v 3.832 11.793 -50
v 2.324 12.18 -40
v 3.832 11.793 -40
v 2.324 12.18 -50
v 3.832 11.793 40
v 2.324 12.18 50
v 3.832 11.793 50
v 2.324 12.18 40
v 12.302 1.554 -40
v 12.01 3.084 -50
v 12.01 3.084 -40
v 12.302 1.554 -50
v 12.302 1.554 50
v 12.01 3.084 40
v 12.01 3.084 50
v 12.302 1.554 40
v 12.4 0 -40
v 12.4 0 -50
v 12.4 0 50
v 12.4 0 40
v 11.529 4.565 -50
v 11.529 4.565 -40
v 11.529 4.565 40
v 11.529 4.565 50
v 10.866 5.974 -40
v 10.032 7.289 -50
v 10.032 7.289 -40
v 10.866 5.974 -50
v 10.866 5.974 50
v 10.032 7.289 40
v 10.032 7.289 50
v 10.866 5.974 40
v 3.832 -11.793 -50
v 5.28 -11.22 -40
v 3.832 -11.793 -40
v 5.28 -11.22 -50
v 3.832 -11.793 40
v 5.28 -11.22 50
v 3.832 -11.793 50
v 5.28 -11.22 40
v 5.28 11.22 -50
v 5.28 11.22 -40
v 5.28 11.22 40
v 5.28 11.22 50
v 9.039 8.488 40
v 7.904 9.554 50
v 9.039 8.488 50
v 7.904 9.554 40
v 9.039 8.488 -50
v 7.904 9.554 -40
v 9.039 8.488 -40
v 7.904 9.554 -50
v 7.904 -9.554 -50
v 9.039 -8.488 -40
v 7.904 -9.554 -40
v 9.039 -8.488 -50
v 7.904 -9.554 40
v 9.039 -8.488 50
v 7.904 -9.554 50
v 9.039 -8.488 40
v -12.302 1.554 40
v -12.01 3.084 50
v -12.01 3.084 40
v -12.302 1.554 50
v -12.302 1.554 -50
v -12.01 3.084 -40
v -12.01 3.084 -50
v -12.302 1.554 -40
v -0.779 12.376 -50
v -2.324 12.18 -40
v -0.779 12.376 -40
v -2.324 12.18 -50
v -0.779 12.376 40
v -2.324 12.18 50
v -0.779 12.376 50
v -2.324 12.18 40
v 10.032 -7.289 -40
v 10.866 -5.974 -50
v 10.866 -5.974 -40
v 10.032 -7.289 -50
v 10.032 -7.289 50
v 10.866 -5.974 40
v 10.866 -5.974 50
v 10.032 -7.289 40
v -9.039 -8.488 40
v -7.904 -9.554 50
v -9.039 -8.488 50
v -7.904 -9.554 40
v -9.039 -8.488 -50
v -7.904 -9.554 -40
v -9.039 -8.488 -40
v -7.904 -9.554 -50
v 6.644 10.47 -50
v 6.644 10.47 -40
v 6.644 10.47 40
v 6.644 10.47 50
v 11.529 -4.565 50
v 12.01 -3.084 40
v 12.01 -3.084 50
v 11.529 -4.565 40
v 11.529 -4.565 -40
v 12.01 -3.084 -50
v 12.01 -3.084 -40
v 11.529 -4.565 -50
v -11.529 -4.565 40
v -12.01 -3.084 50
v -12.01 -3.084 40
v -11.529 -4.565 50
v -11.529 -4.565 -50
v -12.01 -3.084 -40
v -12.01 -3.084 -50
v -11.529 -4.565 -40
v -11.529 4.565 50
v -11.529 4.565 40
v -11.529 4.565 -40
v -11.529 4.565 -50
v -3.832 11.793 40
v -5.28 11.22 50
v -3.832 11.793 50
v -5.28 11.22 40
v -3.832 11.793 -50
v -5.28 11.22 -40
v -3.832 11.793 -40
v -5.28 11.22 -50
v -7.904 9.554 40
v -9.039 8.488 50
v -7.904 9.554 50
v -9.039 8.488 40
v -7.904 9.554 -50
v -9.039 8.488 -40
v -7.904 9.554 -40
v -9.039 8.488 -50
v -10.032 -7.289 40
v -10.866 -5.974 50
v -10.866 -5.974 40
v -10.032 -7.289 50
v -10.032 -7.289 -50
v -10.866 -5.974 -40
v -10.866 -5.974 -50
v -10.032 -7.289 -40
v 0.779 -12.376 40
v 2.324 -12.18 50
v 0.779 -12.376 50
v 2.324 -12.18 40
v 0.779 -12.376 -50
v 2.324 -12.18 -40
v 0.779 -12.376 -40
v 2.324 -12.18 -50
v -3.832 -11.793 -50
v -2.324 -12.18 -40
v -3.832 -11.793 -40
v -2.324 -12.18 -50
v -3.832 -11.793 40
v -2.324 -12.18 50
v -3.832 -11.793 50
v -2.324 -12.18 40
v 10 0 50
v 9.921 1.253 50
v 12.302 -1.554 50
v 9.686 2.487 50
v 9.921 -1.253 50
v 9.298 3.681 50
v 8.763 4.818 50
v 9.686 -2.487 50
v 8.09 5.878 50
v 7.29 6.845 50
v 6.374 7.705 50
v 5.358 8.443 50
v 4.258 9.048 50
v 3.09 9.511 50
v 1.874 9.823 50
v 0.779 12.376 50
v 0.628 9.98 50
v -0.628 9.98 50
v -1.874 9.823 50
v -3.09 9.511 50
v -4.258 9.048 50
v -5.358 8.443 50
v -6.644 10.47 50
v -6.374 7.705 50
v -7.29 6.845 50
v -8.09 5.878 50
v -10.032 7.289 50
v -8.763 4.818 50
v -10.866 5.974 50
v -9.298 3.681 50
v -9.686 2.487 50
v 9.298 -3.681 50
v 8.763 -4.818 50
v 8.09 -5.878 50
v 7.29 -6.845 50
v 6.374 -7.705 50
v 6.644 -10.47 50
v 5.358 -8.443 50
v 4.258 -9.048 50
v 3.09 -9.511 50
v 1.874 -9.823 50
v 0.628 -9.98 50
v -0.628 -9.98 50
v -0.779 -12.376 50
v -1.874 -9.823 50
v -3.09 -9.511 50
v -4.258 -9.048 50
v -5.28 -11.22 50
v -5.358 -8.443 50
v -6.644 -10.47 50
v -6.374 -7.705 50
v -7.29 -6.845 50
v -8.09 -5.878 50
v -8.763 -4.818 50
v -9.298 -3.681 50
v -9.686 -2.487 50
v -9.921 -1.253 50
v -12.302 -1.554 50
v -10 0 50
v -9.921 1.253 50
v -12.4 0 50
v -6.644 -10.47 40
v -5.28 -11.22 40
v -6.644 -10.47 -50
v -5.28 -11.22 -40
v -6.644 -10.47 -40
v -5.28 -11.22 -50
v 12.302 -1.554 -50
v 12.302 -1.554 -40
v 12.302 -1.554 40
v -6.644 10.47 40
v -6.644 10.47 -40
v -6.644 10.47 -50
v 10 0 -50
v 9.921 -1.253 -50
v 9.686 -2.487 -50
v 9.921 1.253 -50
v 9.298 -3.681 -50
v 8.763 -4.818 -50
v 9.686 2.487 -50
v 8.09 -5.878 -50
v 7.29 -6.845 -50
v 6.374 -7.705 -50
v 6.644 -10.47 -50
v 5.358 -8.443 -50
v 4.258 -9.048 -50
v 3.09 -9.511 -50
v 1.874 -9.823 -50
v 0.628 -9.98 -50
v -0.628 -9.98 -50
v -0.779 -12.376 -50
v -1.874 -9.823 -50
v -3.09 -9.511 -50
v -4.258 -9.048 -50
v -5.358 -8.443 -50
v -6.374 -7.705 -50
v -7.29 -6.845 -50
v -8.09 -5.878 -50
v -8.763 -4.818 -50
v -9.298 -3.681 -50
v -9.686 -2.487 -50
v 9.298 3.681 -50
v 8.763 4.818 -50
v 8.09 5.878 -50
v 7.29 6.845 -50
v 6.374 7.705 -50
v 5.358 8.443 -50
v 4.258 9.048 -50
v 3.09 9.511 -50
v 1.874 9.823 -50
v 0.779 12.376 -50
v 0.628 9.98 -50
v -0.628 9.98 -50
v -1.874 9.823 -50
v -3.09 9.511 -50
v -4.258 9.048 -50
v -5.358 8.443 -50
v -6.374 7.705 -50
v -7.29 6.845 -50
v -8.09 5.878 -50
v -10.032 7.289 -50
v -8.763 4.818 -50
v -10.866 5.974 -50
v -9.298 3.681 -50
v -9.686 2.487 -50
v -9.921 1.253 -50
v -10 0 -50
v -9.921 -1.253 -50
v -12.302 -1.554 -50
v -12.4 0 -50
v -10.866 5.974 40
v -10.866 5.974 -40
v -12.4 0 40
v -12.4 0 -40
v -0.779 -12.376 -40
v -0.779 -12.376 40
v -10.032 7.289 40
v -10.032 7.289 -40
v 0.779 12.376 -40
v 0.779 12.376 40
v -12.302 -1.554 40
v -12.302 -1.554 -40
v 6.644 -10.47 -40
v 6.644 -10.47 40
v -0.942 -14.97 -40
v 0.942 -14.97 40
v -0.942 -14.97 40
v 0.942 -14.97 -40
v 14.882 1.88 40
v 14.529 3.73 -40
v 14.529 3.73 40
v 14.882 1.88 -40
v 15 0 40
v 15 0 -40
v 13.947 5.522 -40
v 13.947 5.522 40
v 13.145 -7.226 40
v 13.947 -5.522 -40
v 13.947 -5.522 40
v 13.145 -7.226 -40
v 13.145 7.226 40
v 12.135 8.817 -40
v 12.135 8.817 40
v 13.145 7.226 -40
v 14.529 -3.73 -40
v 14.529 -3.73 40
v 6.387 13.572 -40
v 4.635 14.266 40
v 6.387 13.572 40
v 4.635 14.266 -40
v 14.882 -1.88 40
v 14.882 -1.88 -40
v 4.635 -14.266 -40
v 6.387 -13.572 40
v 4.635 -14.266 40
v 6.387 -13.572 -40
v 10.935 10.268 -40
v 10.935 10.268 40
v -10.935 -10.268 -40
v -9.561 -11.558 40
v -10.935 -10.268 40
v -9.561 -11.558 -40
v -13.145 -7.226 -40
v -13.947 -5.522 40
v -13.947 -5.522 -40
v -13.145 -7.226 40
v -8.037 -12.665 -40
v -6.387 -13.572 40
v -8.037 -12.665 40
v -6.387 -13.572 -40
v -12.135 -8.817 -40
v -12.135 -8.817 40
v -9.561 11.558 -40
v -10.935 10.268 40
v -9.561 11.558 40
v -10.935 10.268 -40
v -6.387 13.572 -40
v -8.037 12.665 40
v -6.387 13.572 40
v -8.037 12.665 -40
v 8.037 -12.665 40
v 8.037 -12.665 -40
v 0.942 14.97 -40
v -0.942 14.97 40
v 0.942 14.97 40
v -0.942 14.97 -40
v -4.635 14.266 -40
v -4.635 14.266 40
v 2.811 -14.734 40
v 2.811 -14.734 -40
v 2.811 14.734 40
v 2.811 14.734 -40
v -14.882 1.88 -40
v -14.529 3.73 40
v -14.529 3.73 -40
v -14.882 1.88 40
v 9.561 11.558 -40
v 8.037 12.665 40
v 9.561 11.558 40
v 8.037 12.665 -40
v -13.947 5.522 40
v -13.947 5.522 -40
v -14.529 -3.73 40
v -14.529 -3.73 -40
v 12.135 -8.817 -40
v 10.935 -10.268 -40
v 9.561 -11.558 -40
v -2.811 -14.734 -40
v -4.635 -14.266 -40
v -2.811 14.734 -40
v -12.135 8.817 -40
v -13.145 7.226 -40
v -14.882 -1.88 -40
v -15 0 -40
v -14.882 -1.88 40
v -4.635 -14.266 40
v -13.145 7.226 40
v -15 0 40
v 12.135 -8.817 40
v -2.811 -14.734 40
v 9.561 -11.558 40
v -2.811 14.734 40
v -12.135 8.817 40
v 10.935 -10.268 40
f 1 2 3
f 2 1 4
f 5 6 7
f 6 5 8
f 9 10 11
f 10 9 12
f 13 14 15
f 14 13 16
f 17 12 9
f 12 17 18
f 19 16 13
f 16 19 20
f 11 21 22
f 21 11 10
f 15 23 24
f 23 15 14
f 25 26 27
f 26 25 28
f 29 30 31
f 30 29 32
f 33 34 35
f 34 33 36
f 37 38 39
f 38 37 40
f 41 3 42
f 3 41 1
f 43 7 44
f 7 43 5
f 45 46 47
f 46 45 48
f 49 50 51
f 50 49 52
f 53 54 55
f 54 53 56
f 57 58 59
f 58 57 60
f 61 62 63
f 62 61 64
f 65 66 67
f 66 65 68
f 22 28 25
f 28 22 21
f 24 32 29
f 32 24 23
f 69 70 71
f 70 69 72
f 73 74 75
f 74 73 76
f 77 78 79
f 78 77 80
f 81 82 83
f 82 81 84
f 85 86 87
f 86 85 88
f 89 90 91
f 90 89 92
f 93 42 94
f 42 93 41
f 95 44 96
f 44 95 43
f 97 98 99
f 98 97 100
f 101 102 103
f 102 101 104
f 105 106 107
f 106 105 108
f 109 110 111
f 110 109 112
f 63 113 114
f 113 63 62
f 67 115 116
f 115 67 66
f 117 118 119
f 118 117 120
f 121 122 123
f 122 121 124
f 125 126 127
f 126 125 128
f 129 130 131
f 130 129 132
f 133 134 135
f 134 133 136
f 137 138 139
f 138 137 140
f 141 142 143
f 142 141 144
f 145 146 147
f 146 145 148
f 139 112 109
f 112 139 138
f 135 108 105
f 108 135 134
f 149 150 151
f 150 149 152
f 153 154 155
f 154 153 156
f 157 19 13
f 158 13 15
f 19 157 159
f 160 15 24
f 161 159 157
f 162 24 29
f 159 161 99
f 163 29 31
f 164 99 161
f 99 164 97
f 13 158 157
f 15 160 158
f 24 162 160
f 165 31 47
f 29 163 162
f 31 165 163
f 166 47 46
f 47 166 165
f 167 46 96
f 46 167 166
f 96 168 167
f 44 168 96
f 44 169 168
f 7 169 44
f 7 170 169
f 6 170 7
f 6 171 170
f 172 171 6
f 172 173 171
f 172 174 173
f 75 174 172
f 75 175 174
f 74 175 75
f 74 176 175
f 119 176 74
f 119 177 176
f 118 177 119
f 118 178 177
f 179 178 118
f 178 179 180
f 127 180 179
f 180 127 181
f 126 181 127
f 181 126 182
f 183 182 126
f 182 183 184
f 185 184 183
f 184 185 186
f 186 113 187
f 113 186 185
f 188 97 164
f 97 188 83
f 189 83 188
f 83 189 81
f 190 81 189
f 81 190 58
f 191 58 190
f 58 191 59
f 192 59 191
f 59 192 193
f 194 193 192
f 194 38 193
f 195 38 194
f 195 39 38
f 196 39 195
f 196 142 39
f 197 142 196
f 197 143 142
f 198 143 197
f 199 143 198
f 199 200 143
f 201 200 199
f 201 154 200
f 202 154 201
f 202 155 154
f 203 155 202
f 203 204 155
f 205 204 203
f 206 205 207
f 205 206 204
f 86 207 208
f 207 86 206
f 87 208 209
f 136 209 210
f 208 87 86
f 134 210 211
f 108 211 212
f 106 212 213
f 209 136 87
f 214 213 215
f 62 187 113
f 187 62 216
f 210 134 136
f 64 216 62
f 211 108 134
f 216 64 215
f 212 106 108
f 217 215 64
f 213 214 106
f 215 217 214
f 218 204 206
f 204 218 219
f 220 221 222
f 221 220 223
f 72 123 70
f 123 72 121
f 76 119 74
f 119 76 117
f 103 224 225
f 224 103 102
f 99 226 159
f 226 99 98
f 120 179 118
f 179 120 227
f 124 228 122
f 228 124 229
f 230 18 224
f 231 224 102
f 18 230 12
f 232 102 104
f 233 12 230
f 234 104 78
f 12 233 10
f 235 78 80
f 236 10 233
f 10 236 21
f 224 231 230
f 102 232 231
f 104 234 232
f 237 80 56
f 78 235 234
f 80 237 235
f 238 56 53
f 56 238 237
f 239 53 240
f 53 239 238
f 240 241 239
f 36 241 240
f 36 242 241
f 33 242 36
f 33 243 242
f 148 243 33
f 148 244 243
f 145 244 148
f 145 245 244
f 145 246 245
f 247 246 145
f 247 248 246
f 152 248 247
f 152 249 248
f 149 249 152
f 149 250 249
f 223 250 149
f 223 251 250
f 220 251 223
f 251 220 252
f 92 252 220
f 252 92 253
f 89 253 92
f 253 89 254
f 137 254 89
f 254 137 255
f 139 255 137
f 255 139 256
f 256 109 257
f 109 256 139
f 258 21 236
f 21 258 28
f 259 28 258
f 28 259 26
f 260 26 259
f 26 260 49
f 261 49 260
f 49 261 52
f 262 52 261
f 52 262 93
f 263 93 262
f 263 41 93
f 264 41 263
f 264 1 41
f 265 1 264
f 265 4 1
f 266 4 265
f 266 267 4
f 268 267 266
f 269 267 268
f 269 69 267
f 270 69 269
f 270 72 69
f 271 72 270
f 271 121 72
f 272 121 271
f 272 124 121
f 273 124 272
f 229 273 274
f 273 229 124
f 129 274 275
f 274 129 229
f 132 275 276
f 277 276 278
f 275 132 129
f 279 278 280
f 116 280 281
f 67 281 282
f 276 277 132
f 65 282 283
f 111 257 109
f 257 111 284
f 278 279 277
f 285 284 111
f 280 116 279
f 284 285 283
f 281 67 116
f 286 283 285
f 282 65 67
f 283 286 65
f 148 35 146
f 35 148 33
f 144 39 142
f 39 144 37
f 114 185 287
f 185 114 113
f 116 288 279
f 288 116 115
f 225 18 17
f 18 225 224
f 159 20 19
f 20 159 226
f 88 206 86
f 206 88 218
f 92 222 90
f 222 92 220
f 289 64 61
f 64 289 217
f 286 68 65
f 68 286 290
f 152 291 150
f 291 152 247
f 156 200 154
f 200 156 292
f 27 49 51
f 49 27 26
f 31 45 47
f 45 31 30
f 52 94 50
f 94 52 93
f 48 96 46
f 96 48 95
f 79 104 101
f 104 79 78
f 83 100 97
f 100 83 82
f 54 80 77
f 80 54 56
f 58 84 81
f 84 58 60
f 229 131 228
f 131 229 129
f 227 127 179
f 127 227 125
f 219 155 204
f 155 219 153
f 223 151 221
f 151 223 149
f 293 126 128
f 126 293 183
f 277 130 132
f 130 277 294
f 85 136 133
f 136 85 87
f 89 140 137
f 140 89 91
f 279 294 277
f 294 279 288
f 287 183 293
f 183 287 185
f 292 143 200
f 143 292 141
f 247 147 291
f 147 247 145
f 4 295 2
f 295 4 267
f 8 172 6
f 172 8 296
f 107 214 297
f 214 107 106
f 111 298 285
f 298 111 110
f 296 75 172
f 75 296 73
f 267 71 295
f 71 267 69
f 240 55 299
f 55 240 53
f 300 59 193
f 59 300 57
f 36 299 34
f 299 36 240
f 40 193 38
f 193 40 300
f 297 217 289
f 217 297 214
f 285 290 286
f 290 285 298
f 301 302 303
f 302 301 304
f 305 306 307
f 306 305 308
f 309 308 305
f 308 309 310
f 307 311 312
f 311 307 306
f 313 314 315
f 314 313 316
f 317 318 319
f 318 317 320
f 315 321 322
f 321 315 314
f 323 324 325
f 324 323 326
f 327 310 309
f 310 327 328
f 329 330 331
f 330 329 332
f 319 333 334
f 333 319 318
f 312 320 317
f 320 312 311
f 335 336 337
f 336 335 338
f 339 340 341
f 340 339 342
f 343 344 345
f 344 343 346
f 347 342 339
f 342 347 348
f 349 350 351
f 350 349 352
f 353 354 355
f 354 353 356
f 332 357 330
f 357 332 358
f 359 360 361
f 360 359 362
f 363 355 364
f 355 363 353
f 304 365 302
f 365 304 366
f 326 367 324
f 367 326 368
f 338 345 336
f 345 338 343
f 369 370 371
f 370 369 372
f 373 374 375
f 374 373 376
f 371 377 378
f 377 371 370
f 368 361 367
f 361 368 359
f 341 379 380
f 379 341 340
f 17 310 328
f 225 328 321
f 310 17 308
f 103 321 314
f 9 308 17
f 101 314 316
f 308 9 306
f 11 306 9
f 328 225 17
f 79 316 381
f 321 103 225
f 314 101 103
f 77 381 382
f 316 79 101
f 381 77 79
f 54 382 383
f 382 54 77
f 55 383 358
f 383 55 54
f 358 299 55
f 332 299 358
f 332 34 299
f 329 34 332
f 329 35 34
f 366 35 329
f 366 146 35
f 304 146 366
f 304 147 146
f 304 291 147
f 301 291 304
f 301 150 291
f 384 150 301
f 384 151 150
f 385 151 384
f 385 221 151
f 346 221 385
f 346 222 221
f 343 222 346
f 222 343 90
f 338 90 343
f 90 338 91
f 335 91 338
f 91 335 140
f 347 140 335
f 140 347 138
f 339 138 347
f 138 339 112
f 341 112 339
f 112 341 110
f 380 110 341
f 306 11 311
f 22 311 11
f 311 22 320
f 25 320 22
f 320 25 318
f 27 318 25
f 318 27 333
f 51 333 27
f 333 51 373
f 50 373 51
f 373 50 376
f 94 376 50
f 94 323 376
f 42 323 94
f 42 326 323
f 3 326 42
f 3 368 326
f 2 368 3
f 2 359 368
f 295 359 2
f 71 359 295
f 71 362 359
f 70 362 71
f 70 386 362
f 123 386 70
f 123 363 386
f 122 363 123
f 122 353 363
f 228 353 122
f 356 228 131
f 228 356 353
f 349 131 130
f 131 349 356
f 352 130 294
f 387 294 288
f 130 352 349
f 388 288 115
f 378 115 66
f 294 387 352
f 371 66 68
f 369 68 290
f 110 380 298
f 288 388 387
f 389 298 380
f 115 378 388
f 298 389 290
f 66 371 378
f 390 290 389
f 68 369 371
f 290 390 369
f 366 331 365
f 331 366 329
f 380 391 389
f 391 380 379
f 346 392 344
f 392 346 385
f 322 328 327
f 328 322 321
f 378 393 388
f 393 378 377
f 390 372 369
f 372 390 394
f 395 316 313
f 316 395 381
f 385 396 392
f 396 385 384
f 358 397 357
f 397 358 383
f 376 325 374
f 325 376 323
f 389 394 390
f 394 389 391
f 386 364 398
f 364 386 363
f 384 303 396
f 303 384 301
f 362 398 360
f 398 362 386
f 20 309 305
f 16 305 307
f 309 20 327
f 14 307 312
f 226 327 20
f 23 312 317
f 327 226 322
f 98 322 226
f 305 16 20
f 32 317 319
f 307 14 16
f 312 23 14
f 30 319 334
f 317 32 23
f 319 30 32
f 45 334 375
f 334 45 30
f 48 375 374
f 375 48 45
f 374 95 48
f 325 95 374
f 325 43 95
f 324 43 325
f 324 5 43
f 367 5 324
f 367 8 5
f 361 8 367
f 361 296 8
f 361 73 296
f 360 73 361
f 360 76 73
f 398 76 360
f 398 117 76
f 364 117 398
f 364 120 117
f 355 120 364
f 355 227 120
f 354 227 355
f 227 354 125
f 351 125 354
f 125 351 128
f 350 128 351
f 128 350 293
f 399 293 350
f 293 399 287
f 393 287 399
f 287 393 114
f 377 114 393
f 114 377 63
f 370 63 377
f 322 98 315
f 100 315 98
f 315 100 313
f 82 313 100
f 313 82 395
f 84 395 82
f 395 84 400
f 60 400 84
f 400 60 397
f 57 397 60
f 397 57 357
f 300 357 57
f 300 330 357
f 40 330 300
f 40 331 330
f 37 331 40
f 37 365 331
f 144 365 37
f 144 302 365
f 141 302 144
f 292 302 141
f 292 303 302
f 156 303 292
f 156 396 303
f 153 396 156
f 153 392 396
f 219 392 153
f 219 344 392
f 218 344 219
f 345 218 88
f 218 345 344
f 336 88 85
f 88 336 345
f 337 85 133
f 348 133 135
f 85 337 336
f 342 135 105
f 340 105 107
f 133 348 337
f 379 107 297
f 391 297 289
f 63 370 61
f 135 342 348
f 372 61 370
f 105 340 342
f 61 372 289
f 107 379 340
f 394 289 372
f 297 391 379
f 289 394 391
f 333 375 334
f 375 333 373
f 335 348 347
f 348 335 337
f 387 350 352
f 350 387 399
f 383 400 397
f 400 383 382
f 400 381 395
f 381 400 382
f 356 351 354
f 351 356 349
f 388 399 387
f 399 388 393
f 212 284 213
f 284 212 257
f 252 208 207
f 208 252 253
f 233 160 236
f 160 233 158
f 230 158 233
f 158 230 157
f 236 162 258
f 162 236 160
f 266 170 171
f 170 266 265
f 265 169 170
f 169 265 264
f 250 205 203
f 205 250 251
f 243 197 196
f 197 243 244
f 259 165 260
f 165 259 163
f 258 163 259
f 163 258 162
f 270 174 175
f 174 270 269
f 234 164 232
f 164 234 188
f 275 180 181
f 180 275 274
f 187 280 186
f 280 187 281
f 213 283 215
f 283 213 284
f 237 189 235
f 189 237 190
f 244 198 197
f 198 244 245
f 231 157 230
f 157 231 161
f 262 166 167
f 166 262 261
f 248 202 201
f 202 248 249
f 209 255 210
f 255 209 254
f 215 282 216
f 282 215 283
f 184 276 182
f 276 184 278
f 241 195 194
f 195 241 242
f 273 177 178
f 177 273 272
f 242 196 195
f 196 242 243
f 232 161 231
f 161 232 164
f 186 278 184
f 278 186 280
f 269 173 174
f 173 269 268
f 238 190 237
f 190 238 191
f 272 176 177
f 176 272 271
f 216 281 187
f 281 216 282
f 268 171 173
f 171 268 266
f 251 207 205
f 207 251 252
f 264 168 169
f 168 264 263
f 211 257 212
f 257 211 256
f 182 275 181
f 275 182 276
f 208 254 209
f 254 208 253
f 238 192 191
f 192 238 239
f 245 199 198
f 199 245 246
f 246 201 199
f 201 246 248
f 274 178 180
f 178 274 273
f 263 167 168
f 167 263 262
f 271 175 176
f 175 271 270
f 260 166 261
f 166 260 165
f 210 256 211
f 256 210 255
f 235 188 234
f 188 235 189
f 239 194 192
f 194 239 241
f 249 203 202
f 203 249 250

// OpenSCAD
module aa_pipe(){
    difference(){
        union(){
            cylinder(h=100,r=12.4,center=true,$fn=50);
            cylinder(h=80,r=15,center=true,$fn=50);
        }
        cylinder(h=1000,r=10,center=true,$fn=50);
    }
}


module aa_connect(){
difference(){
    union(){
    cube([30,10,40],center=true);
    }
    rotate([90,0,0])cylinder(h=100,r=1.6,center=true,$fn=50);
}
}


module aa_mid(){
difference(){
    union(){
    cube([40,20,200],center=true);
    //rotate([90,0,0])cylinder(h=100,r=15,center=true,$fn=50);
    }
    //
    cube([30.2,10.2,999],center=true);
    //
    translate([0,0,  50])rotate([90,0,0])cylinder(h=100,r=12.6,center=true,$fn=50);
    translate([0,0,   0])rotate([90,0,0])cylinder(h=999,r=12.6,center=true,$fn=50);
    translate([0,0, -50])rotate([90,0,0])cylinder(h=100,r=12.6,center=true,$fn=50);
    //
    translate([0,0, 100-20])rotate([90,0,0])cylinder(h=100,r=1.6,center=true,$fn=50);
    translate([0,0,-100+20])rotate([90,0,0])cylinder(h=100,r=1.6,center=true,$fn=50);
    //
    translate([0,0, 100])rotate([90,0,0])cylinder(h=100,r=1.6,center=true,$fn=50);
    translate([0,0,-100])rotate([90,0,0])cylinder(h=100,r=1.6,center=true,$fn=50);
}
}

module aa_bot_1(){
    difference(){
        union(){
        translate([0,-5/2,20+40/2])cube([30,5,40],center=true);
        //
        translate([0,-10/2,20/2])cube([40,10,20],center=true);
        }
        translate([0,-10+5/2,20+20])rotate([90,0,0])cylinder(h=55,r=1.6,center=true,$fn=50);
    }
}
module aa_bot(){
    aa_bot_1();
    translate([0,-100,0])mirror([0,1,0])aa_bot_1();
    
    difference(){
        translate([0,-100/2, 10/2])cube([200,100,10],center=true);
        translate([0,-100/2, 10/2])cube([120,80,100],center=true);
        //
        translate([-100+20, -25, -10/2])cylinder(h=55,r=1.6,center=true,$fn=50);
        translate([-100+20, -50, -10/2])cylinder(h=55,r=10,center=true,$fn=50);
        translate([-100+20, -75, -10/2])cylinder(h=55,r=1.6,center=true,$fn=50);
        //
        translate([ 100-20, -25, -10/2])cylinder(h=55,r=1.6,center=true,$fn=50);
        translate([ 100-20, -50, -10/2])cylinder(h=55,r=10,center=true,$fn=50);
        translate([ 100-20, -75, -10/2])cylinder(h=55,r=1.6,center=true,$fn=50);
    }
}


en_d = 1;
if(en_d){
    aa_pipe();
}

en_c = 0;
if(en_c==1){
translate([0,0,240])aa_connect();
}

en_b = 0;
if(en_b==1){
translate([0,0,120+2])aa_mid();
}

en_a1 = 0;
if(en_a1){
translate([0,100,0])aa_bot_1();
translate([0,100,0])mirror([0,1,0])aa_bot_1();
//
aa_bot_1();
mirror([0,1,0])aa_bot_1();
//
translate([0,50,10/2])cube([40,100,10],center=true);
}

en_a = 0;
if(en_a==1){
translate([0,-60,0/2])aa_bot_1();
translate([0,-40,0/2])mirror([0,1,0])aa_bot_1();

//translate([0,100,0/2])aa_bot();
translate([0,0,0/2])aa_bot();
}

//translate([0,-100/2, 200/2])rotate([90,0,0])cylinder(h=62,r=100,center=true,$fn=50);



















module connect(){
    difference(){
        union(){
        rotate([90,0,0])cylinder(h=40,r=12.5,center=true,$fn=50);
        cube([30-0.2,30-0.2,40],center=true);
        }
        rotate([90,0,0])cylinder(h=100,r=10,center=true,$fn=50);
        cube([20,20,100],center=true);
    }
}

module bb(){
translate([0,-100+10/2,100])rotate([90,0,0])cylinder(h=10,r=20,$fn=50);
translate([0,0,100])rotate([90,0,0])cylinder(h=100,r=12.5,$fn=50);
}

module aa(){
difference(){
    cube([40,40,200],center=true);
    cube([30,30,200],center=true);
    translate([0,0, 100])rotate([90,0,0])cylinder(h=100,r=12.6,center=true,$fn=50);
    translate([0,0,  50])rotate([0,90,0])cylinder(h=100,r=12.6,center=true,$fn=50);
    translate([0,0,   0])rotate([90,0,0])cylinder(h=100,r=12.6,center=true,$fn=50);
    translate([0,0, -50])rotate([0,90,0])cylinder(h=100,r=12.6,center=true,$fn=50);
    translate([0,0,-100])rotate([90,0,0])cylinder(h=100,r=12.6,center=true,$fn=50);
}
}

module top(){
difference(){
    union(){
    translate([0,0,20+20/2])cube([30-0.2,30-0.2,20],center=true);
    translate([0,0,10+10/2])cube([40,40,10],center=true);
    rotate([0,0, 45])translate([0,0,10/2])cube([28,200,10],center=true);
    rotate([0,0,-45])translate([0,0,10/2])cube([28,200,10],center=true);
    }
    translate([0,0,20+20/2])cube([20.2,20.2,20.02],center=true);
}
}

module bottom(){
difference(){
    union(){
    translate([0,0,20+20/2])cube([30-0.2,30-0.2,20],center=true);
    translate([0,0,10+10/2])cube([40,40,10],center=true);
    translate([0,0,10/2])cube([40,200,10],center=true);
    translate([0, 100-40/2,10/2])cube([200,40,10],center=true);
    translate([0,-100+40/2,10/2])cube([200,40,10],center=true);
    }
    translate([0,0,20+20/2])cube([20.2,20.2,20.02],center=true);
    //translate([0,0, 100])rotate([0,90,0])cylinder(h=100,r=100,center=true,$fn=50);
}
}
/*
translate([0,0,260])connect();
translate([0,0,120])aa();
bottom();
*/
